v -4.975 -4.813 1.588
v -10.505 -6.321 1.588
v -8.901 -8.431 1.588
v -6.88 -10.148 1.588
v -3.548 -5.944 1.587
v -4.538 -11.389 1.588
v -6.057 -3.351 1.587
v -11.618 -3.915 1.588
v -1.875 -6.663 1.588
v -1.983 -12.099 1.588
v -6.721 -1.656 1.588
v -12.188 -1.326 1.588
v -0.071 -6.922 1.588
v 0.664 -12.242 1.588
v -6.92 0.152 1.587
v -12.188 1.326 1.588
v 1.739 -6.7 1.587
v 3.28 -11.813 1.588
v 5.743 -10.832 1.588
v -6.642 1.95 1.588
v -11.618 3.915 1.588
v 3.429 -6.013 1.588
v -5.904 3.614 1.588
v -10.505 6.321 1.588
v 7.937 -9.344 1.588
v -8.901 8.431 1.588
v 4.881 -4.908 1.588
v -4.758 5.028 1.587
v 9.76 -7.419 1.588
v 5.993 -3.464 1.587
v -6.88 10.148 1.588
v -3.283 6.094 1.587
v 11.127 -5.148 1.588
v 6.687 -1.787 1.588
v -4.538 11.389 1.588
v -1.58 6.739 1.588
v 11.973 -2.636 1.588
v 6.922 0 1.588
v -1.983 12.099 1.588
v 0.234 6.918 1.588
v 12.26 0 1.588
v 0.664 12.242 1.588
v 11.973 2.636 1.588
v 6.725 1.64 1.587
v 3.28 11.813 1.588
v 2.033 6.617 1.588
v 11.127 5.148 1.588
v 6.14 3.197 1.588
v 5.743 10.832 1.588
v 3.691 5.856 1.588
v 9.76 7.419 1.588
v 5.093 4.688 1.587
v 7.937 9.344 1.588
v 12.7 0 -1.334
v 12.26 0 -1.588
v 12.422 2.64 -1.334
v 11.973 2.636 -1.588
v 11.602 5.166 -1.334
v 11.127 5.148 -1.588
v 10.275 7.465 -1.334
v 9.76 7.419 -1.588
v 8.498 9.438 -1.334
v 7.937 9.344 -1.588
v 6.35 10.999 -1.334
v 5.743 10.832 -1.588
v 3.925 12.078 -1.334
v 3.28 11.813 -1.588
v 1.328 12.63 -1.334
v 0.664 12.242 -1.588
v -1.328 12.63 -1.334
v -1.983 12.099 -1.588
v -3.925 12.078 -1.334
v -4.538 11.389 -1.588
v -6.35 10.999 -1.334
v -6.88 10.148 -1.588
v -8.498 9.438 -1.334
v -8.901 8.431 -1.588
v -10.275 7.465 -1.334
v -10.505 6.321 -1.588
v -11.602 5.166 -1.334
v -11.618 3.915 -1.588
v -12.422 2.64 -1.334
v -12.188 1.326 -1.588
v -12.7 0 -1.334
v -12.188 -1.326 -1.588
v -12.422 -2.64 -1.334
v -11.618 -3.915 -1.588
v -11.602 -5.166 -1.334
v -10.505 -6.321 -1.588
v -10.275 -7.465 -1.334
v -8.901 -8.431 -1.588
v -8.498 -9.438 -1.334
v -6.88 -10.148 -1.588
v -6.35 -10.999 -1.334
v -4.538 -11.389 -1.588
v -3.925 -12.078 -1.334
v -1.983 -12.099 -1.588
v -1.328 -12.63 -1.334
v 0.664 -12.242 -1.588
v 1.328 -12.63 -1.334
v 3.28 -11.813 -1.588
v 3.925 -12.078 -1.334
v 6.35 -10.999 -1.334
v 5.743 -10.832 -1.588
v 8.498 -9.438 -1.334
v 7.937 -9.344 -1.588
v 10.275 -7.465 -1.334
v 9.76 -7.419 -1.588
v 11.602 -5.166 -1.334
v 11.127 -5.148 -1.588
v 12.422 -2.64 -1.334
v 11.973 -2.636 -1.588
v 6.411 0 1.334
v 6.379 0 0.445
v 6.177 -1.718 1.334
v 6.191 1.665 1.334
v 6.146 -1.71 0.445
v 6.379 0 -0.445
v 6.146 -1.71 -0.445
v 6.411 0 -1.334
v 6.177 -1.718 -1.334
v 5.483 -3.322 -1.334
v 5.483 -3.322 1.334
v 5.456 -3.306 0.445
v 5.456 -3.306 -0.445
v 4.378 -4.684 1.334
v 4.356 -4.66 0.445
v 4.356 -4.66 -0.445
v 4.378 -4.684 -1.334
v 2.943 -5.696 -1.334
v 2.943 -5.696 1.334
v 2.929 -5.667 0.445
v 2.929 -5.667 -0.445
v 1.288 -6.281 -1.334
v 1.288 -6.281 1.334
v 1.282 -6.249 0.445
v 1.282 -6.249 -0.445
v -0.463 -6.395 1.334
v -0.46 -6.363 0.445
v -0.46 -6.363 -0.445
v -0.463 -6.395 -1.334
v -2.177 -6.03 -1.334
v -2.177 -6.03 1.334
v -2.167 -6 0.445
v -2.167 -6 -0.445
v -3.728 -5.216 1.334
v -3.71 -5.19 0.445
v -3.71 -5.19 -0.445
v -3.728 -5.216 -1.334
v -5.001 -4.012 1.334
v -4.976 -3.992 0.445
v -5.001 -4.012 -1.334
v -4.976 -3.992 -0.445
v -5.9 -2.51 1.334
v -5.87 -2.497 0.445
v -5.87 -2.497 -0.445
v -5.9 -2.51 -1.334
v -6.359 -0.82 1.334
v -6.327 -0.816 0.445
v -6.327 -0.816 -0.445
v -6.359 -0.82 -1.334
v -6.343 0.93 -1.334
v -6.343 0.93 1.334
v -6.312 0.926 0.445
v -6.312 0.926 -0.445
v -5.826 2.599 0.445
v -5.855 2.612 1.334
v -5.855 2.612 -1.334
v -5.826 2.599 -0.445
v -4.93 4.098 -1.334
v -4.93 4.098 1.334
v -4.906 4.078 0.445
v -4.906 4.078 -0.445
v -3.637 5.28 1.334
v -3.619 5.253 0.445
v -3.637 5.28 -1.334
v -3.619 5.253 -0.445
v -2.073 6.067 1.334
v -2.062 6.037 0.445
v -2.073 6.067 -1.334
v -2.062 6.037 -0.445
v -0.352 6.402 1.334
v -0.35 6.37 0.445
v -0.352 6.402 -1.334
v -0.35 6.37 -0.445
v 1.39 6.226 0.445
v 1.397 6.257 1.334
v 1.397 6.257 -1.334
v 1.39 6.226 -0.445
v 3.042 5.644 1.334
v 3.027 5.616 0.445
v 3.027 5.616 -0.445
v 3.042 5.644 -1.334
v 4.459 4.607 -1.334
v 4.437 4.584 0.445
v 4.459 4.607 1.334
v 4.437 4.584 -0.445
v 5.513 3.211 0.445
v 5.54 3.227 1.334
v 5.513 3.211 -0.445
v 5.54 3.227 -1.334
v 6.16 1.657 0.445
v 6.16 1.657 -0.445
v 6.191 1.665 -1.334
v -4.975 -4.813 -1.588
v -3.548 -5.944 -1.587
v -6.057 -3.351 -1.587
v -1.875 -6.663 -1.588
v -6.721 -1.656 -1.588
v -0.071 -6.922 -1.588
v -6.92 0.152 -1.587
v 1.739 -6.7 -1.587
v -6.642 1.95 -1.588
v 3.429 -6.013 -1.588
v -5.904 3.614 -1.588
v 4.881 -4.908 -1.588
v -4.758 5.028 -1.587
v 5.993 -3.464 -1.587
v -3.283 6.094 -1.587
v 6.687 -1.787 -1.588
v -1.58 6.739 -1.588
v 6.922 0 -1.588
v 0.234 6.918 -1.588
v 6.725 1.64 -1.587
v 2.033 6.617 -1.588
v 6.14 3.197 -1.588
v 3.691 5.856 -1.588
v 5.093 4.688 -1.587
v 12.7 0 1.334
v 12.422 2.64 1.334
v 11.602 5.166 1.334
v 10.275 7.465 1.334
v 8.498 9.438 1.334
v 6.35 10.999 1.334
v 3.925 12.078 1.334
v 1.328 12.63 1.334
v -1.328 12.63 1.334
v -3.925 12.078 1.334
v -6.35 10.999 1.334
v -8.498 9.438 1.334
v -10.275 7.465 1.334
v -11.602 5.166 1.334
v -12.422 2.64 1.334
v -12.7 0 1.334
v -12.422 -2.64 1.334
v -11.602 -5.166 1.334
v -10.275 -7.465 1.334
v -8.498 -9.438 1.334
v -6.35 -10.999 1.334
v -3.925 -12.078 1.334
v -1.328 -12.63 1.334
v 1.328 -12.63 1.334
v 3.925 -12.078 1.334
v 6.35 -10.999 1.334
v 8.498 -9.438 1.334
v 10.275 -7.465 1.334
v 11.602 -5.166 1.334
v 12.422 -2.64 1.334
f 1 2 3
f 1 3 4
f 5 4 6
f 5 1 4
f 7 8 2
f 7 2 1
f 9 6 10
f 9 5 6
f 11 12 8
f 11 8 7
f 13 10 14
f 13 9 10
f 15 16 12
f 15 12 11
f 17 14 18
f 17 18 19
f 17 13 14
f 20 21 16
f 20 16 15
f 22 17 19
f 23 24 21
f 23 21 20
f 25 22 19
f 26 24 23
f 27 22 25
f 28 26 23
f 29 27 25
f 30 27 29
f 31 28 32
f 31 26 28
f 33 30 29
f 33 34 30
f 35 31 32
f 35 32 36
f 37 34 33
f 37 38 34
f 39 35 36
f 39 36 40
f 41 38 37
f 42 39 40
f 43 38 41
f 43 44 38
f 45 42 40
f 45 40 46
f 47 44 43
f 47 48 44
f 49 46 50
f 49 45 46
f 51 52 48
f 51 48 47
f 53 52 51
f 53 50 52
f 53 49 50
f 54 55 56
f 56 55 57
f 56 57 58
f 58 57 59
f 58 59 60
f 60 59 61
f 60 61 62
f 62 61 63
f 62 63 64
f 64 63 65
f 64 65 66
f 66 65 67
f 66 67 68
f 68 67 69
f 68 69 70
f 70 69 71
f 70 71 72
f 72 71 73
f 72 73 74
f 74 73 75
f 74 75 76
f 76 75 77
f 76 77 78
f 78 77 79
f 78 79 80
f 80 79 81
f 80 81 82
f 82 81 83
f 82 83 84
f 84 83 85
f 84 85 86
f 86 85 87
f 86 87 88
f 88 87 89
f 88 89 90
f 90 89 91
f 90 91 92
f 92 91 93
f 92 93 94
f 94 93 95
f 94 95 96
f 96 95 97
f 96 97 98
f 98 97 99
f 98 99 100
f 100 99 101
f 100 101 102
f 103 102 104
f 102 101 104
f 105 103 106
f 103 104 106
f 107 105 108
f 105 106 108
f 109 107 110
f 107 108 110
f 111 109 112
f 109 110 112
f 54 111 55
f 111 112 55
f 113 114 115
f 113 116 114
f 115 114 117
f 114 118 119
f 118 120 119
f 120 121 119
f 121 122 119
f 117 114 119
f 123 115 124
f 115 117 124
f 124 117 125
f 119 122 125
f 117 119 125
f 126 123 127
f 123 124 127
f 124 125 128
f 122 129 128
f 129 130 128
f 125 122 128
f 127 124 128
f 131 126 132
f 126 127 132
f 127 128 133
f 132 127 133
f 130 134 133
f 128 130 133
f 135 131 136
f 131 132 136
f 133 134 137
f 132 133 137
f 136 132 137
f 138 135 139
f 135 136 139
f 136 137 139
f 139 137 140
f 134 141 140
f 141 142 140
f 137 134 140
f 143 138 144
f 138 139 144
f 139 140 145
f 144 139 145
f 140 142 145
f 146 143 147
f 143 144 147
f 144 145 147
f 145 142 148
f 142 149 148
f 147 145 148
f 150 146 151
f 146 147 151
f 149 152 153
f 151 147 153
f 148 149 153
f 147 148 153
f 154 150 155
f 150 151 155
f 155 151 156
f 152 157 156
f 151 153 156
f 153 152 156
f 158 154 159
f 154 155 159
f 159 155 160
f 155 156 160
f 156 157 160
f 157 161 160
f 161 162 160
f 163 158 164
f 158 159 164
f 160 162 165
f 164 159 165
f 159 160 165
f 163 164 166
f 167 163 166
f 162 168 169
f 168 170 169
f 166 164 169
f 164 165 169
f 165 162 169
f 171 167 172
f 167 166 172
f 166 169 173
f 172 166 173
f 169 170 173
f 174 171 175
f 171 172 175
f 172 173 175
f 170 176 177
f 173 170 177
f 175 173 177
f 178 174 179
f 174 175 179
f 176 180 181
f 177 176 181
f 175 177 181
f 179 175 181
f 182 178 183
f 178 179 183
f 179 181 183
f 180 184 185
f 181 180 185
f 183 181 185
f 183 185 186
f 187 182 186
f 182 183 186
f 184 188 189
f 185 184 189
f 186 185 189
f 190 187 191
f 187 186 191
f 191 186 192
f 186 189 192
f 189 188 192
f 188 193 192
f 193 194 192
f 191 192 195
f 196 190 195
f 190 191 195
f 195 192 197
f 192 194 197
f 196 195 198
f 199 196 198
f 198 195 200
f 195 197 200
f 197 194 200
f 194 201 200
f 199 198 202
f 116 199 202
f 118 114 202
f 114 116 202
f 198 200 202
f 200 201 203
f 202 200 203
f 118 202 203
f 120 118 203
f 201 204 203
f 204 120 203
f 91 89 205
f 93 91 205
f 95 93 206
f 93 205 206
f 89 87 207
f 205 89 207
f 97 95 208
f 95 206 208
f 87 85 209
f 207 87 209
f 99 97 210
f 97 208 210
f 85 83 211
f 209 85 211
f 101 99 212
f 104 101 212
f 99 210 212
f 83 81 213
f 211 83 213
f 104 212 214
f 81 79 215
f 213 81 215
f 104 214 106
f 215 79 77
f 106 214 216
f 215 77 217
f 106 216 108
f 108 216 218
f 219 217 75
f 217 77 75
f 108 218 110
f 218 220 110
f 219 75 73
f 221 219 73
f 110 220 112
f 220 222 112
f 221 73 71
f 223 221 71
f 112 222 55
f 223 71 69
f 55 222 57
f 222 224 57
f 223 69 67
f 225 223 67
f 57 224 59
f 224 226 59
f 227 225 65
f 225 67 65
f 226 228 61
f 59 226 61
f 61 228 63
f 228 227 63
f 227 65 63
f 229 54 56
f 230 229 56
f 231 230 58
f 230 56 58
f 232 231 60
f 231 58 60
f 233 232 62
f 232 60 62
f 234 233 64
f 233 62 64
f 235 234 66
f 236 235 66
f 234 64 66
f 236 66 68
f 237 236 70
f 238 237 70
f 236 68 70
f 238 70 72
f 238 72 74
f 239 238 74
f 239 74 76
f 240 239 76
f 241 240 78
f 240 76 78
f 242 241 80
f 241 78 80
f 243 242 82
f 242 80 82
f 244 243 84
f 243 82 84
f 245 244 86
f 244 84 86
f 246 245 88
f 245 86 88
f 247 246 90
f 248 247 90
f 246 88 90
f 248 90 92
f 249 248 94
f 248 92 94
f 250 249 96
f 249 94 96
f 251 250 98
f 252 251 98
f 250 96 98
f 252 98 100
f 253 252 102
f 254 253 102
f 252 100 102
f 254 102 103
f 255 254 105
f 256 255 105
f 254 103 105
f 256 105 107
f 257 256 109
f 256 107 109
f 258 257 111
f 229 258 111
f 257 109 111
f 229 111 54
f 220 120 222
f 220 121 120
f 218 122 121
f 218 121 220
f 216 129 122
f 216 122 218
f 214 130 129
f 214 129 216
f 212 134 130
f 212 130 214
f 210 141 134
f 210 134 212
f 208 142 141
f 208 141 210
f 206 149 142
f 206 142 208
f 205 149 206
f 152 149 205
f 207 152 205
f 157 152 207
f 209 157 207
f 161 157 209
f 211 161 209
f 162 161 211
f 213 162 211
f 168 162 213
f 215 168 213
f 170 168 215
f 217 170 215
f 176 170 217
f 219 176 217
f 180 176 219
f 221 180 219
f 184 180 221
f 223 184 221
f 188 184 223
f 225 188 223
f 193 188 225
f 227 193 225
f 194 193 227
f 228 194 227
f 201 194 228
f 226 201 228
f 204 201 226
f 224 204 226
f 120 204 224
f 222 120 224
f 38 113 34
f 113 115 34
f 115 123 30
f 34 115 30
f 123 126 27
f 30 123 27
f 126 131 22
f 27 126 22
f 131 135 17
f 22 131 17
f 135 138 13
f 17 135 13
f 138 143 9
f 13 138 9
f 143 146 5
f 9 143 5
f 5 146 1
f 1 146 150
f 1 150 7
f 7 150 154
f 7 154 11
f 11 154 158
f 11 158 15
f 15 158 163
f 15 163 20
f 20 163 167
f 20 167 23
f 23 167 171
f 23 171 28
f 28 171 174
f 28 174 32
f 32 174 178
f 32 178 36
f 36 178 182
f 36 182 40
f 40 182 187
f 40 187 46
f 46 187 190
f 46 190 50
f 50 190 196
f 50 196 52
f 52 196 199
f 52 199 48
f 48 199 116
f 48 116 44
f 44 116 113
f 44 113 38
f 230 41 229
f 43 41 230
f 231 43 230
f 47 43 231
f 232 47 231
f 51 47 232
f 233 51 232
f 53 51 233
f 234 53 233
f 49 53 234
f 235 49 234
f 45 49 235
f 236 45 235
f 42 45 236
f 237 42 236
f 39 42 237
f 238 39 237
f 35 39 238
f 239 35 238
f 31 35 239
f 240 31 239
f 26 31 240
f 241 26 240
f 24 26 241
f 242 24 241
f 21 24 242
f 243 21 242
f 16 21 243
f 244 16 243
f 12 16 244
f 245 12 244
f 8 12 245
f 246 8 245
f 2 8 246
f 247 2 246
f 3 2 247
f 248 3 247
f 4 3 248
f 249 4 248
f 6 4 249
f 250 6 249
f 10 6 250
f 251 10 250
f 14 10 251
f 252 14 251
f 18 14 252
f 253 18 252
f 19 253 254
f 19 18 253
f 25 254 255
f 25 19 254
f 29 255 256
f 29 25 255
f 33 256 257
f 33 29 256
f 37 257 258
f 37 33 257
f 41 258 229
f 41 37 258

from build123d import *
from OCP.BRepFilletAPI import BRepFilletAPI_MakeChamfer

# Parameters (mm, degrees)
BOSS_EXTRUDE1_DEPTH      = 1.5875
BOSS_EXTRUDE1_DEPTH_BACK = 1.5875
SKETCH3_R                = 12.7
SKETCH3_R_2              = 6.3754
CHAMFER1_SIZE            = 0.254
CHAMFER1_SIZE2           = 0.439940905
CHAMFER2_SIZE            = 0.254
CHAMFER2_SIZE2           = 0.495866606


with BuildPart() as part:
    # Sketch3 → Boss-Extrude1 (new, two sides: drawn at the far end of the back side and taken through both)
    with BuildSketch(Plane.XY.offset(-BOSS_EXTRUDE1_DEPTH_BACK)):
        Circle(SKETCH3_R)
        Circle(SKETCH3_R_2, mode=Mode.SUBTRACT)
    extrude(amount=BOSS_EXTRUDE1_DEPTH + BOSS_EXTRUDE1_DEPTH_BACK)

    # Chamfer1: one chamfer whose edges measure the first distance from different faces: ONE call of the kernel's chamfer builder (chamfer() names one face for all edges)
    chamfer1_edges_1 = [part.edges().sort_by_distance(p)[0] for p in [
        (-12.7, 0, 1.5875),
    ]]
    chamfer1_side_1 = [part.faces().sort_by_distance(p)[0] for p in [
        (-12.7, 0, 0.79375),
    ]]
    chamfer1_edges_2 = [part.edges().sort_by_distance(p)[0] for p in [
        (-12.7, 0, -1.5875),
    ]]
    chamfer1_side_2 = [part.faces().sort_by_distance(p)[0] for p in [
        (-12.7, 0, -0.79375),
    ]]
    chamfer1 = BRepFilletAPI_MakeChamfer(part.part.solid().wrapped)
    for e in chamfer1_edges_1:
        chamfer1.Add(CHAMFER1_SIZE, CHAMFER1_SIZE2, e.wrapped, chamfer1_side_1[0].wrapped)  # the first distance lies on this face
    for e in chamfer1_edges_2:
        chamfer1.Add(CHAMFER1_SIZE, CHAMFER1_SIZE2, e.wrapped, chamfer1_side_2[0].wrapped)  # the first distance lies on this face
    add(Compound.cast(chamfer1.Shape()), mode=Mode.REPLACE)

    # Sketch4 → Cut-Revolve1 (revolve, cut)
    with BuildSketch(Plane(origin=(0, 0, 0), x_dir=(0, 0, -1), z_dir=(1, 0, 0)), mode=Mode.PRIVATE) as cut_revolve1_sk:
        with BuildLine():
            Line((-1.5875, 6.3246), (-1.5875, 6.4262))
            ThreePointArc((-1.5875, 6.4262), (0, 6.3754), (1.5875, 6.4262))
            Line((1.5875, 6.4262), (1.5875, 6.3246))
            Line((1.5875, 6.3246), (-1.5875, 6.3246))
        make_face()
    revolve(cut_revolve1_sk.sketch.rotate(Axis((0, 0, 1.5875), (0, 0, -1)), 90), axis=Axis((0, 0, 1.5875), (0, 0, -1)), mode=Mode.SUBTRACT)

    # Chamfer2: one chamfer whose edges measure the first distance from different faces: ONE call of the kernel's chamfer builder (chamfer() names one face for all edges)
    chamfer2_edges_1 = [part.edges().sort_by_distance(p)[0] for p in [
        (-6.4262, 0, -1.5875),
    ]]
    chamfer2_side_1 = [part.faces().sort_by_distance(p)[0] for p in [
        (-6.38810325, 0, -0.794156296),
    ]]
    chamfer2_edges_2 = [part.edges().sort_by_distance(p)[0] for p in [
        (-6.4262, 0, 1.5875),
    ]]
    chamfer2_side_2 = [part.faces().sort_by_distance(p)[0] for p in [
        (-6.38810325, 0, 0.794156296),
    ]]
    chamfer2 = BRepFilletAPI_MakeChamfer(part.part.solid().wrapped)
    for e in chamfer2_edges_1:
        chamfer2.Add(CHAMFER2_SIZE, CHAMFER2_SIZE2, e.wrapped, chamfer2_side_1[0].wrapped)  # the first distance lies on this face
    for e in chamfer2_edges_2:
        chamfer2.Add(CHAMFER2_SIZE, CHAMFER2_SIZE2, e.wrapped, chamfer2_side_2[0].wrapped)  # the first distance lies on this face
    add(Compound.cast(chamfer2.Shape()), mode=Mode.REPLACE)


solid = part.part
